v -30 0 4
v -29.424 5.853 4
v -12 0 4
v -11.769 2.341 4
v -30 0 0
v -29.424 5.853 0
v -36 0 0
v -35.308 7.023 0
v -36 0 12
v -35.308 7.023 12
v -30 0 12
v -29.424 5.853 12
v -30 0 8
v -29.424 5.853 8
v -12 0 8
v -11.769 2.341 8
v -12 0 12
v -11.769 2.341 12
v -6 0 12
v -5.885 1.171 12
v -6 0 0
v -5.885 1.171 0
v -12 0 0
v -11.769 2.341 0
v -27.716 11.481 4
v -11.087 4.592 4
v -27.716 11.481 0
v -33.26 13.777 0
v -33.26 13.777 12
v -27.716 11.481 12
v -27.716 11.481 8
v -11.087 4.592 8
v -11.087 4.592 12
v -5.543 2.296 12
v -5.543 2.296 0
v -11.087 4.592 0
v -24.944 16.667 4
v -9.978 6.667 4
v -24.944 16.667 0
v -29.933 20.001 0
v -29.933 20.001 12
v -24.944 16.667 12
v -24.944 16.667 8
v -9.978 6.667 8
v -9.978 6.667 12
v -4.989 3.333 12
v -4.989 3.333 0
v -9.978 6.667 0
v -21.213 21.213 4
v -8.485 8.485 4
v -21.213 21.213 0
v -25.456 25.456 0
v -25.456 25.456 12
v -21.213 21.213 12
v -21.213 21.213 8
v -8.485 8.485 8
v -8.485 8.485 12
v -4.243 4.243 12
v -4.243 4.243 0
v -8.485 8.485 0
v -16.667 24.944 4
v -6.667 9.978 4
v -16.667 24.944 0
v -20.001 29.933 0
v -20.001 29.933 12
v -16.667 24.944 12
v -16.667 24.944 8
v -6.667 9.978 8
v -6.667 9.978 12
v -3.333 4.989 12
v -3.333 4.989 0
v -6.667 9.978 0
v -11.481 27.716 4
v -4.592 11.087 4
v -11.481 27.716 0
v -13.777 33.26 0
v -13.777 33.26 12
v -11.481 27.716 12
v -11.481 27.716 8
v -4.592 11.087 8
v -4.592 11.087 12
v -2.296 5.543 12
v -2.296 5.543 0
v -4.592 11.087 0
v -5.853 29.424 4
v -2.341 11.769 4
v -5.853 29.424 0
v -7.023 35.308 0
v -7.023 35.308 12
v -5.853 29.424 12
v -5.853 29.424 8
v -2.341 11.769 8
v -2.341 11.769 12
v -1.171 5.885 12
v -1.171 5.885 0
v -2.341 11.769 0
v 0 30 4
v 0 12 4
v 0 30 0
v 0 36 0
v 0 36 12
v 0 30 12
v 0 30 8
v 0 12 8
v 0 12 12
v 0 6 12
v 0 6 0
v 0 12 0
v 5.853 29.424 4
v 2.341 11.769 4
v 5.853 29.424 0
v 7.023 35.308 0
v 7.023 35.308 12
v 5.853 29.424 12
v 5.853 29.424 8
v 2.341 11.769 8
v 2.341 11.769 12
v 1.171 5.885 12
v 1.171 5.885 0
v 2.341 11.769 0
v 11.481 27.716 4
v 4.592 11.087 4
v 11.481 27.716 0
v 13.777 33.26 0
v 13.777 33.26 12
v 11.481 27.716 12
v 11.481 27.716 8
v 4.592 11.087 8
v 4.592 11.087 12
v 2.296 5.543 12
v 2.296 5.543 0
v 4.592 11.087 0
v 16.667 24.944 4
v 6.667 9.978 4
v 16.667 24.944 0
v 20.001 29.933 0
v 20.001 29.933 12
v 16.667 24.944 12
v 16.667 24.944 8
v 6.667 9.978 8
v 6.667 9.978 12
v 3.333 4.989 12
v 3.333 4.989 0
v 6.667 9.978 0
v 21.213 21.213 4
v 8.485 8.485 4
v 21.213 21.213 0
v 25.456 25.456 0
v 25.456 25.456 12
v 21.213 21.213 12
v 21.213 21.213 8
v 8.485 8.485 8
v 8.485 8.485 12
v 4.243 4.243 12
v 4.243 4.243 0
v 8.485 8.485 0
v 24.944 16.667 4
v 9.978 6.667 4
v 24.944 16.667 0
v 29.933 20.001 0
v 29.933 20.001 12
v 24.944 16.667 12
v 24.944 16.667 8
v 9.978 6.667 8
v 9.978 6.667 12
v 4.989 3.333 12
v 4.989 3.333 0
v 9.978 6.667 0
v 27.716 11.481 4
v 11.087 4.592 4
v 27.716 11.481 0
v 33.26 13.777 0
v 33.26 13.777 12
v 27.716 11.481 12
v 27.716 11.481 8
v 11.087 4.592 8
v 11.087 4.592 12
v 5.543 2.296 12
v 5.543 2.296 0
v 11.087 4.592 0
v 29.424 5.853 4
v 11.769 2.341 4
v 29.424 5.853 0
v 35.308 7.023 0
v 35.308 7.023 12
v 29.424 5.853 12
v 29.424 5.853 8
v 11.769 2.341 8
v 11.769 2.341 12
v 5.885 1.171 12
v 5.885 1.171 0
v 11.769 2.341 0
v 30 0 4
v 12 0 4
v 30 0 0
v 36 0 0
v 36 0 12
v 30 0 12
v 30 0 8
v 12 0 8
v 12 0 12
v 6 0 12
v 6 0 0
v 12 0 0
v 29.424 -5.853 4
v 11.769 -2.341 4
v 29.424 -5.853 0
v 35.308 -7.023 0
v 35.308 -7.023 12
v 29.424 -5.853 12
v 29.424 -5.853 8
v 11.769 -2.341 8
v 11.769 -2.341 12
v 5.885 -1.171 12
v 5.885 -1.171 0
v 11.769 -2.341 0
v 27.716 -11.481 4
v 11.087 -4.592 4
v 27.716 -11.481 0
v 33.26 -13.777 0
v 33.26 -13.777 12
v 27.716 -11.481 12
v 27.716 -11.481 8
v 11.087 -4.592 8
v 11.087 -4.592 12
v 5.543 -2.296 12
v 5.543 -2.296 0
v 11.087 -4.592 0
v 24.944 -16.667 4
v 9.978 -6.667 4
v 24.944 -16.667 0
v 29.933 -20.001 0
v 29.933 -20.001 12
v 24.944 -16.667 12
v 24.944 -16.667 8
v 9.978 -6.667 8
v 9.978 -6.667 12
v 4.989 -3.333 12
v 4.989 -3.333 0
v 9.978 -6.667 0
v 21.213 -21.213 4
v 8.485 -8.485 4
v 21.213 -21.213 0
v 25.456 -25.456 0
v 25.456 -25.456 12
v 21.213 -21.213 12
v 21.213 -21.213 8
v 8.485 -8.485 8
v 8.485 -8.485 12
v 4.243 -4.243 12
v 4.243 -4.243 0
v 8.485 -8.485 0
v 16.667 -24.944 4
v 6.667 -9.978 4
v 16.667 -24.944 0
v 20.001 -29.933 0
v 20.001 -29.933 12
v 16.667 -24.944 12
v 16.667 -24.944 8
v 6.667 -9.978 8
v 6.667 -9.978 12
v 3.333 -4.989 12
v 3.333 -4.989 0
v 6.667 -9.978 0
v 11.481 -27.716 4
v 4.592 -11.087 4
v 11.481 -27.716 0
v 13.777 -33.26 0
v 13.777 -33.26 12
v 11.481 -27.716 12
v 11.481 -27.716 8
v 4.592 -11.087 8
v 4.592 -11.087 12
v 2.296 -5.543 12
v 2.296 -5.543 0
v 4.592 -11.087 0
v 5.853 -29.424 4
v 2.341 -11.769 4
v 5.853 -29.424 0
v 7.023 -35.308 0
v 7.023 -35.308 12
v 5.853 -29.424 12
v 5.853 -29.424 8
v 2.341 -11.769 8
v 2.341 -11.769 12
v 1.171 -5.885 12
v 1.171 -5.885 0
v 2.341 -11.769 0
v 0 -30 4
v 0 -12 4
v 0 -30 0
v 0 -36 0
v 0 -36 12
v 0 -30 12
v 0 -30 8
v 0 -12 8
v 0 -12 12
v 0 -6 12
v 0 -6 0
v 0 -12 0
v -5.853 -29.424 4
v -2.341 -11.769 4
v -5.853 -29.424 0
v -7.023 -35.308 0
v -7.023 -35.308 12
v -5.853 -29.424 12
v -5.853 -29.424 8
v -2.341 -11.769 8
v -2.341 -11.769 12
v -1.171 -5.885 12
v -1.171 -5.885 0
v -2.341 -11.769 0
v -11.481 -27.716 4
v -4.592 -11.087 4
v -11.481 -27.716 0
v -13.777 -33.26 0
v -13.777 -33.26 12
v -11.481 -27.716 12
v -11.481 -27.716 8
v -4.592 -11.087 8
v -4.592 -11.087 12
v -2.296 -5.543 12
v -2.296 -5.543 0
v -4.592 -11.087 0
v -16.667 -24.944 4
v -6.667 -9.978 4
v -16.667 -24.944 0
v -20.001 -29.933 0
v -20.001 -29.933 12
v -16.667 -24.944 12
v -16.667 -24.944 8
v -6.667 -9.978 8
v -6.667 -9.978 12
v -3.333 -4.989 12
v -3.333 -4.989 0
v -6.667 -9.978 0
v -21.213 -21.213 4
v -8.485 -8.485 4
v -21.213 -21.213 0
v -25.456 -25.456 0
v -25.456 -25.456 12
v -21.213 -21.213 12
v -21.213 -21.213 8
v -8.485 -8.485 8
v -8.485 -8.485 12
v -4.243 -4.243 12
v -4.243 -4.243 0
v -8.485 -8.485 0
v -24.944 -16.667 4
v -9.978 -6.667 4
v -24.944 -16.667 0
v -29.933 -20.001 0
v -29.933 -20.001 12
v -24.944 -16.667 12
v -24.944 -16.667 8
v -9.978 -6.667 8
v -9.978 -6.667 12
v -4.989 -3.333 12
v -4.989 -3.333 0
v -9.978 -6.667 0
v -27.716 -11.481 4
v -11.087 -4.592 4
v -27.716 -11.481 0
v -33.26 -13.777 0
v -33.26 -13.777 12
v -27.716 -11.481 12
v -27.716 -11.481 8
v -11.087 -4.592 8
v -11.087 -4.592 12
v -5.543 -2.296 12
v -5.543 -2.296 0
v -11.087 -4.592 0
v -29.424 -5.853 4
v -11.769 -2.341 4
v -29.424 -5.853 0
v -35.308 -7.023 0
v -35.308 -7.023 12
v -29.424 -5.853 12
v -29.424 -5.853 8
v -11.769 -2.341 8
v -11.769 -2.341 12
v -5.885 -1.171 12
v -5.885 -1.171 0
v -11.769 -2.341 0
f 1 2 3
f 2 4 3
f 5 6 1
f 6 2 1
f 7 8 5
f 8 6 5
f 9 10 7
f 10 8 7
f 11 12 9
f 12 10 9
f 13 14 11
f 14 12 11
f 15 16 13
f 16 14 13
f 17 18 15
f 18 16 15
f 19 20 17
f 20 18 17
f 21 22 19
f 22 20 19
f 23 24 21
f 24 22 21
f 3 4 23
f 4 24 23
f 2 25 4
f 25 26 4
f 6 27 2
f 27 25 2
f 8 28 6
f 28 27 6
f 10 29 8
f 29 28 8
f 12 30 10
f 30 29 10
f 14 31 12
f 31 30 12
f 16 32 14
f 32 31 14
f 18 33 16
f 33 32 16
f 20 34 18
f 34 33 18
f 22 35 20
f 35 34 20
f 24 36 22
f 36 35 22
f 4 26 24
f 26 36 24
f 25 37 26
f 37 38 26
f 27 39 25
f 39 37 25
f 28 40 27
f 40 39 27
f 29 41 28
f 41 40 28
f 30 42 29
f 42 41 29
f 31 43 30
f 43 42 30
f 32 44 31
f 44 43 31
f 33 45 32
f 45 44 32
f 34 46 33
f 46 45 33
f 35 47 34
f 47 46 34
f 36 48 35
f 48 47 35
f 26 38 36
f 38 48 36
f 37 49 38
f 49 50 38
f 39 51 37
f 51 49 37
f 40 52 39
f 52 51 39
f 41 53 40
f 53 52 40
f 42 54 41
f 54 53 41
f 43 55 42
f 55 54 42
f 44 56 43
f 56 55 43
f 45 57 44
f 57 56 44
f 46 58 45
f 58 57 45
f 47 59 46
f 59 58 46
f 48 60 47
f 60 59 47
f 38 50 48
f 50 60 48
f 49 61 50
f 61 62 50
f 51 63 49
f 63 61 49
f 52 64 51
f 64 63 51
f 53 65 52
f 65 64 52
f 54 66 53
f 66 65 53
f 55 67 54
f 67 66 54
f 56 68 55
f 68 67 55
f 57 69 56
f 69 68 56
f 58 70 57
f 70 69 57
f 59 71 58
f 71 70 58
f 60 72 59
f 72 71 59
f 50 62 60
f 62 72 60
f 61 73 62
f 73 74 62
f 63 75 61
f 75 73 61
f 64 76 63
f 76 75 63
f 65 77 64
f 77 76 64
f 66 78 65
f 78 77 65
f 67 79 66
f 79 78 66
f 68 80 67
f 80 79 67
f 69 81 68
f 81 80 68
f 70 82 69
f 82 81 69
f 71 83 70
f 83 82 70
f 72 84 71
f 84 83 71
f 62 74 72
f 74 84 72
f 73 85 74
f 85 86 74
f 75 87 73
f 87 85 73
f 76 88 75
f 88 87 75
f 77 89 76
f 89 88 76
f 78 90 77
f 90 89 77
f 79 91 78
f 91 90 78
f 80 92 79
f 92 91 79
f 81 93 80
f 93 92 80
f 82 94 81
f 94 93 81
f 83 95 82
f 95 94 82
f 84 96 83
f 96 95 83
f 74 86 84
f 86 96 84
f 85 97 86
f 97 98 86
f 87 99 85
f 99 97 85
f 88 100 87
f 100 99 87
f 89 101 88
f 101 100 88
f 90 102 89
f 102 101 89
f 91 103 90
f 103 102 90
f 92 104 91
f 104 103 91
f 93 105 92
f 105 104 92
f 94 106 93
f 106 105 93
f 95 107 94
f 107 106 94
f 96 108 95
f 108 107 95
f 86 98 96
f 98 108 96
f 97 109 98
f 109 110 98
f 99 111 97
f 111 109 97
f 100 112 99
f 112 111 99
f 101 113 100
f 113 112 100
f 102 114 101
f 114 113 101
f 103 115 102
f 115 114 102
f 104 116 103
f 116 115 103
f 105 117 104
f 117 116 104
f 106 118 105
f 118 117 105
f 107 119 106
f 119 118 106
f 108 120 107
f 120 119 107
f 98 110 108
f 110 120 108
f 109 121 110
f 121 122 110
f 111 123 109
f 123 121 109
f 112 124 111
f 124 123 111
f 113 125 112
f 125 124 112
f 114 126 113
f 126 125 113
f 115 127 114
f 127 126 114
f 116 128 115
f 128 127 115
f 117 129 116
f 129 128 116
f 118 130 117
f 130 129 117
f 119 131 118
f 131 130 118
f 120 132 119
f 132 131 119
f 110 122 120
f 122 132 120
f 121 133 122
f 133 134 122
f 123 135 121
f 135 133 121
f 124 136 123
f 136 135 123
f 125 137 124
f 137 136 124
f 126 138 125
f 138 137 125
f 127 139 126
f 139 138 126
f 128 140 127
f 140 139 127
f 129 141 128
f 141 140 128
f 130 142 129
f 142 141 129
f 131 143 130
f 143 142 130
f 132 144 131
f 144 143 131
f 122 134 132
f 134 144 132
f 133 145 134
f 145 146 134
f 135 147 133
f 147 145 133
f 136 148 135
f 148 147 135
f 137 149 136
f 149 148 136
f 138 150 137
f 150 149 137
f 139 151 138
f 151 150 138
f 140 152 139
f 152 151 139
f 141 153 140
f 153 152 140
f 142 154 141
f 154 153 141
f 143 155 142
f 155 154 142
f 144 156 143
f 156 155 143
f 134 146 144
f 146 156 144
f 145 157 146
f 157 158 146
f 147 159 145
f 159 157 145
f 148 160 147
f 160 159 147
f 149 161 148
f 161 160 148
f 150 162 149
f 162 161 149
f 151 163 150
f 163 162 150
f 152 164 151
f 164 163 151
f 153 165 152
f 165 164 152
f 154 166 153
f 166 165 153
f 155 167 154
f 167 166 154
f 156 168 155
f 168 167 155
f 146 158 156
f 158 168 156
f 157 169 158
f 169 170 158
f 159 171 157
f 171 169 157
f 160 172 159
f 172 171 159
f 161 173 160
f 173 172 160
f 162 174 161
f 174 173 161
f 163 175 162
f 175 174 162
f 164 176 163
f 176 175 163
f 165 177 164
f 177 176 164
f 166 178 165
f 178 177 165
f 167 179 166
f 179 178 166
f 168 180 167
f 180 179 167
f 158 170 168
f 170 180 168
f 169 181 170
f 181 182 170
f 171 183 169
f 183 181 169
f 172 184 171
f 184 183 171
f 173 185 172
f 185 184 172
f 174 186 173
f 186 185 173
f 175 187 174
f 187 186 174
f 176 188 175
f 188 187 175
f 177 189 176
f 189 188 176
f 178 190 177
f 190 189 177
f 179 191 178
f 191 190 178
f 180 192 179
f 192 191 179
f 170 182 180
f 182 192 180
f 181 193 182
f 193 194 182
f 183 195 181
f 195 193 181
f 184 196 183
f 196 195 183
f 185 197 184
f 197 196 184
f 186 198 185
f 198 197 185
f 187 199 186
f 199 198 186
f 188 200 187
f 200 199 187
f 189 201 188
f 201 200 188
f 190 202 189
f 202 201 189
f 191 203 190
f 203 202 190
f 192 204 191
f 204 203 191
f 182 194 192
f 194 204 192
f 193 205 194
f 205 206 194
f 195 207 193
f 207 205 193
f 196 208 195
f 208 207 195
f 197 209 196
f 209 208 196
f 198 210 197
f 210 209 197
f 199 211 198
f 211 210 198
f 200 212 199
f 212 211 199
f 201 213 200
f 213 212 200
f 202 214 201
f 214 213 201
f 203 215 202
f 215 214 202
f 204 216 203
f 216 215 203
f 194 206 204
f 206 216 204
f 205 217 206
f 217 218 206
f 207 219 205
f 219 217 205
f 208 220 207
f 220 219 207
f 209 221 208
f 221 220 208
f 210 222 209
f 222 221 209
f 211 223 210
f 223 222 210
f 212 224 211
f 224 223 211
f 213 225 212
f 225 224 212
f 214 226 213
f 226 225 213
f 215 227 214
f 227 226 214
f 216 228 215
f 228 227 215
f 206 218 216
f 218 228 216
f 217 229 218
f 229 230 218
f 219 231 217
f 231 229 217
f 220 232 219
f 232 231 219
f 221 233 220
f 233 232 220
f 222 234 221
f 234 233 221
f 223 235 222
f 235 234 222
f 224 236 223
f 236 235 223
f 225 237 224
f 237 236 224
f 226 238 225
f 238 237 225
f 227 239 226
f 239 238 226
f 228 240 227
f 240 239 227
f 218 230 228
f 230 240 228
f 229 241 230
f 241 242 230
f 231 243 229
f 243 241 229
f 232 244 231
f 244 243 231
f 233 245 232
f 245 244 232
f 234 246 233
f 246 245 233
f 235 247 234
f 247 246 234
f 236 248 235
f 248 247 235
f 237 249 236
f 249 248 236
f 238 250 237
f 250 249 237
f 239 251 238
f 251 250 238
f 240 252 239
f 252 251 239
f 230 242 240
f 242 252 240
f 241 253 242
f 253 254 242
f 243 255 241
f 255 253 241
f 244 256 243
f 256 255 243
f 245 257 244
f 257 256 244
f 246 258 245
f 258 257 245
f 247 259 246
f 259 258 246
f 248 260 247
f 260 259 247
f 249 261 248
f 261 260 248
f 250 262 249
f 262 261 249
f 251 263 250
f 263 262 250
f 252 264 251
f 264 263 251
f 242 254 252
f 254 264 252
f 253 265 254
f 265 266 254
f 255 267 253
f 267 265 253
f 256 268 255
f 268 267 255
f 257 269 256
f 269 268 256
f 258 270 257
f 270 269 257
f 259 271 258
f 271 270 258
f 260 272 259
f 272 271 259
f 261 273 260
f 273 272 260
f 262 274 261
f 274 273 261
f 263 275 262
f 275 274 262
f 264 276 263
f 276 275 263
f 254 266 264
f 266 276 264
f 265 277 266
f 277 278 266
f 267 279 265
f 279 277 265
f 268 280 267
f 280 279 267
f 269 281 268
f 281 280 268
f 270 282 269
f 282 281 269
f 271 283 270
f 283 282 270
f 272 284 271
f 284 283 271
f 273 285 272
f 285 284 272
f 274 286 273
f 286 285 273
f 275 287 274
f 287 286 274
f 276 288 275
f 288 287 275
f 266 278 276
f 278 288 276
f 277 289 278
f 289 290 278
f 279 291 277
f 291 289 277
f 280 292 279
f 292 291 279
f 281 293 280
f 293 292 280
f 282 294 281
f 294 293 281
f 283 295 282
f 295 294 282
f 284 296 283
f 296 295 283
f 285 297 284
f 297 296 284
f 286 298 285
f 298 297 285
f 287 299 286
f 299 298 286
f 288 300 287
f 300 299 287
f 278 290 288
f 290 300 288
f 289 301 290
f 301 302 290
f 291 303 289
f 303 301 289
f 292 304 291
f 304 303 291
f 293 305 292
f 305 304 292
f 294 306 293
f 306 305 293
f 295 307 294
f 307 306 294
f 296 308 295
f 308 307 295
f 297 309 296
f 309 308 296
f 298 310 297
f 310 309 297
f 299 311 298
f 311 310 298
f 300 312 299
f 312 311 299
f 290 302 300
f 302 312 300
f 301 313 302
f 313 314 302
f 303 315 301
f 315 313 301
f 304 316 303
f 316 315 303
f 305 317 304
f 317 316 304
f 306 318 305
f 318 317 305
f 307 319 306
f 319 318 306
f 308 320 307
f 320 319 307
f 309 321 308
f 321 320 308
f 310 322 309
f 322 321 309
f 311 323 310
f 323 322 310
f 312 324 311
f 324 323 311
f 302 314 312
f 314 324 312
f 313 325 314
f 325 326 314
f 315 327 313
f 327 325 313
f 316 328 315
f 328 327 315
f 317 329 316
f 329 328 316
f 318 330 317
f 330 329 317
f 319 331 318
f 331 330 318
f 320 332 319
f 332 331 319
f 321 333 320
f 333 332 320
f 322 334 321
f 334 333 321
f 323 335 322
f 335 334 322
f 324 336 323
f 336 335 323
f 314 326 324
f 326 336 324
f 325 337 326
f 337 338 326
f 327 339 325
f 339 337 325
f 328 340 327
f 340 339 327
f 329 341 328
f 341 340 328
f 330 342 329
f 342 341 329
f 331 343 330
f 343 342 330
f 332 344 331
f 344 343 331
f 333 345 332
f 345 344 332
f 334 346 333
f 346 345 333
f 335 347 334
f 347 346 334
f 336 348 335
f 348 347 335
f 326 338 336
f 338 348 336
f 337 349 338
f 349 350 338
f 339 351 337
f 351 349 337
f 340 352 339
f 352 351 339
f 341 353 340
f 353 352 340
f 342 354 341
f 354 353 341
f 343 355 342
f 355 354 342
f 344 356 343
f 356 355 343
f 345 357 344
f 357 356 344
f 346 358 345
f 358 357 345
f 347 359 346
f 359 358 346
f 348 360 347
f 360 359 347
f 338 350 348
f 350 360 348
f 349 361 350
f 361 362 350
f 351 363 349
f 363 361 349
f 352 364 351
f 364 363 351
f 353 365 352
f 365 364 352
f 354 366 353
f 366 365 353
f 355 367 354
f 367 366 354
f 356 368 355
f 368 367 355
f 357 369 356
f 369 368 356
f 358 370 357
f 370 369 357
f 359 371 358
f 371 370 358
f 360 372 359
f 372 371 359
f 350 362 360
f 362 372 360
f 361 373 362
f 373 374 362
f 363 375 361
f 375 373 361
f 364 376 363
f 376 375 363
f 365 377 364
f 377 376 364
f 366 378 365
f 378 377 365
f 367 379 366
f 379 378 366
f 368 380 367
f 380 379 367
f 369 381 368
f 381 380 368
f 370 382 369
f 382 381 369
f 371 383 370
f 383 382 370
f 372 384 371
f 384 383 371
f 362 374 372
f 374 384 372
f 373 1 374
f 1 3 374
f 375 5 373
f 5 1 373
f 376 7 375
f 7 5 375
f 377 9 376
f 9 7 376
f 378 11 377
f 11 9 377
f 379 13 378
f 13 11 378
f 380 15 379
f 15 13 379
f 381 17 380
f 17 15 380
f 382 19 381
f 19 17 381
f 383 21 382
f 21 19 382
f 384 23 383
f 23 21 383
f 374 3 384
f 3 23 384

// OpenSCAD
$fn = 32;

// ----------------------------------------------------------------------
// Revolved part: handwheel R36
// ----------------------------------------------------------------------

// --- parameters (mm) ---
bore_r = 6;               // bore radius
rim_r = 36;               // rim radius
rim_w = 6;                // rim axial width
rim_t = 12;               // rim diameter height
hub_r = 12;               // hub radius
web_t = 4;                // web thickness
revolve_angle = 360;      // revolve sweep, degrees

bore_d = 2 * bore_r;
rim_d = 2 * rim_r;
hub_d = 2 * hub_r;

profile = [[6, 0], [12, 0], [12, 4], [30, 4], [30, 0], [36, 0], [36, 12], [30, 12], [30, 8], [12, 8], [12, 12], [6, 12]];  // primary outline, 12 points, counter clockwise

// --- the one profile operation ---
rotate_extrude(angle = revolve_angle) polygon(points = profile);
